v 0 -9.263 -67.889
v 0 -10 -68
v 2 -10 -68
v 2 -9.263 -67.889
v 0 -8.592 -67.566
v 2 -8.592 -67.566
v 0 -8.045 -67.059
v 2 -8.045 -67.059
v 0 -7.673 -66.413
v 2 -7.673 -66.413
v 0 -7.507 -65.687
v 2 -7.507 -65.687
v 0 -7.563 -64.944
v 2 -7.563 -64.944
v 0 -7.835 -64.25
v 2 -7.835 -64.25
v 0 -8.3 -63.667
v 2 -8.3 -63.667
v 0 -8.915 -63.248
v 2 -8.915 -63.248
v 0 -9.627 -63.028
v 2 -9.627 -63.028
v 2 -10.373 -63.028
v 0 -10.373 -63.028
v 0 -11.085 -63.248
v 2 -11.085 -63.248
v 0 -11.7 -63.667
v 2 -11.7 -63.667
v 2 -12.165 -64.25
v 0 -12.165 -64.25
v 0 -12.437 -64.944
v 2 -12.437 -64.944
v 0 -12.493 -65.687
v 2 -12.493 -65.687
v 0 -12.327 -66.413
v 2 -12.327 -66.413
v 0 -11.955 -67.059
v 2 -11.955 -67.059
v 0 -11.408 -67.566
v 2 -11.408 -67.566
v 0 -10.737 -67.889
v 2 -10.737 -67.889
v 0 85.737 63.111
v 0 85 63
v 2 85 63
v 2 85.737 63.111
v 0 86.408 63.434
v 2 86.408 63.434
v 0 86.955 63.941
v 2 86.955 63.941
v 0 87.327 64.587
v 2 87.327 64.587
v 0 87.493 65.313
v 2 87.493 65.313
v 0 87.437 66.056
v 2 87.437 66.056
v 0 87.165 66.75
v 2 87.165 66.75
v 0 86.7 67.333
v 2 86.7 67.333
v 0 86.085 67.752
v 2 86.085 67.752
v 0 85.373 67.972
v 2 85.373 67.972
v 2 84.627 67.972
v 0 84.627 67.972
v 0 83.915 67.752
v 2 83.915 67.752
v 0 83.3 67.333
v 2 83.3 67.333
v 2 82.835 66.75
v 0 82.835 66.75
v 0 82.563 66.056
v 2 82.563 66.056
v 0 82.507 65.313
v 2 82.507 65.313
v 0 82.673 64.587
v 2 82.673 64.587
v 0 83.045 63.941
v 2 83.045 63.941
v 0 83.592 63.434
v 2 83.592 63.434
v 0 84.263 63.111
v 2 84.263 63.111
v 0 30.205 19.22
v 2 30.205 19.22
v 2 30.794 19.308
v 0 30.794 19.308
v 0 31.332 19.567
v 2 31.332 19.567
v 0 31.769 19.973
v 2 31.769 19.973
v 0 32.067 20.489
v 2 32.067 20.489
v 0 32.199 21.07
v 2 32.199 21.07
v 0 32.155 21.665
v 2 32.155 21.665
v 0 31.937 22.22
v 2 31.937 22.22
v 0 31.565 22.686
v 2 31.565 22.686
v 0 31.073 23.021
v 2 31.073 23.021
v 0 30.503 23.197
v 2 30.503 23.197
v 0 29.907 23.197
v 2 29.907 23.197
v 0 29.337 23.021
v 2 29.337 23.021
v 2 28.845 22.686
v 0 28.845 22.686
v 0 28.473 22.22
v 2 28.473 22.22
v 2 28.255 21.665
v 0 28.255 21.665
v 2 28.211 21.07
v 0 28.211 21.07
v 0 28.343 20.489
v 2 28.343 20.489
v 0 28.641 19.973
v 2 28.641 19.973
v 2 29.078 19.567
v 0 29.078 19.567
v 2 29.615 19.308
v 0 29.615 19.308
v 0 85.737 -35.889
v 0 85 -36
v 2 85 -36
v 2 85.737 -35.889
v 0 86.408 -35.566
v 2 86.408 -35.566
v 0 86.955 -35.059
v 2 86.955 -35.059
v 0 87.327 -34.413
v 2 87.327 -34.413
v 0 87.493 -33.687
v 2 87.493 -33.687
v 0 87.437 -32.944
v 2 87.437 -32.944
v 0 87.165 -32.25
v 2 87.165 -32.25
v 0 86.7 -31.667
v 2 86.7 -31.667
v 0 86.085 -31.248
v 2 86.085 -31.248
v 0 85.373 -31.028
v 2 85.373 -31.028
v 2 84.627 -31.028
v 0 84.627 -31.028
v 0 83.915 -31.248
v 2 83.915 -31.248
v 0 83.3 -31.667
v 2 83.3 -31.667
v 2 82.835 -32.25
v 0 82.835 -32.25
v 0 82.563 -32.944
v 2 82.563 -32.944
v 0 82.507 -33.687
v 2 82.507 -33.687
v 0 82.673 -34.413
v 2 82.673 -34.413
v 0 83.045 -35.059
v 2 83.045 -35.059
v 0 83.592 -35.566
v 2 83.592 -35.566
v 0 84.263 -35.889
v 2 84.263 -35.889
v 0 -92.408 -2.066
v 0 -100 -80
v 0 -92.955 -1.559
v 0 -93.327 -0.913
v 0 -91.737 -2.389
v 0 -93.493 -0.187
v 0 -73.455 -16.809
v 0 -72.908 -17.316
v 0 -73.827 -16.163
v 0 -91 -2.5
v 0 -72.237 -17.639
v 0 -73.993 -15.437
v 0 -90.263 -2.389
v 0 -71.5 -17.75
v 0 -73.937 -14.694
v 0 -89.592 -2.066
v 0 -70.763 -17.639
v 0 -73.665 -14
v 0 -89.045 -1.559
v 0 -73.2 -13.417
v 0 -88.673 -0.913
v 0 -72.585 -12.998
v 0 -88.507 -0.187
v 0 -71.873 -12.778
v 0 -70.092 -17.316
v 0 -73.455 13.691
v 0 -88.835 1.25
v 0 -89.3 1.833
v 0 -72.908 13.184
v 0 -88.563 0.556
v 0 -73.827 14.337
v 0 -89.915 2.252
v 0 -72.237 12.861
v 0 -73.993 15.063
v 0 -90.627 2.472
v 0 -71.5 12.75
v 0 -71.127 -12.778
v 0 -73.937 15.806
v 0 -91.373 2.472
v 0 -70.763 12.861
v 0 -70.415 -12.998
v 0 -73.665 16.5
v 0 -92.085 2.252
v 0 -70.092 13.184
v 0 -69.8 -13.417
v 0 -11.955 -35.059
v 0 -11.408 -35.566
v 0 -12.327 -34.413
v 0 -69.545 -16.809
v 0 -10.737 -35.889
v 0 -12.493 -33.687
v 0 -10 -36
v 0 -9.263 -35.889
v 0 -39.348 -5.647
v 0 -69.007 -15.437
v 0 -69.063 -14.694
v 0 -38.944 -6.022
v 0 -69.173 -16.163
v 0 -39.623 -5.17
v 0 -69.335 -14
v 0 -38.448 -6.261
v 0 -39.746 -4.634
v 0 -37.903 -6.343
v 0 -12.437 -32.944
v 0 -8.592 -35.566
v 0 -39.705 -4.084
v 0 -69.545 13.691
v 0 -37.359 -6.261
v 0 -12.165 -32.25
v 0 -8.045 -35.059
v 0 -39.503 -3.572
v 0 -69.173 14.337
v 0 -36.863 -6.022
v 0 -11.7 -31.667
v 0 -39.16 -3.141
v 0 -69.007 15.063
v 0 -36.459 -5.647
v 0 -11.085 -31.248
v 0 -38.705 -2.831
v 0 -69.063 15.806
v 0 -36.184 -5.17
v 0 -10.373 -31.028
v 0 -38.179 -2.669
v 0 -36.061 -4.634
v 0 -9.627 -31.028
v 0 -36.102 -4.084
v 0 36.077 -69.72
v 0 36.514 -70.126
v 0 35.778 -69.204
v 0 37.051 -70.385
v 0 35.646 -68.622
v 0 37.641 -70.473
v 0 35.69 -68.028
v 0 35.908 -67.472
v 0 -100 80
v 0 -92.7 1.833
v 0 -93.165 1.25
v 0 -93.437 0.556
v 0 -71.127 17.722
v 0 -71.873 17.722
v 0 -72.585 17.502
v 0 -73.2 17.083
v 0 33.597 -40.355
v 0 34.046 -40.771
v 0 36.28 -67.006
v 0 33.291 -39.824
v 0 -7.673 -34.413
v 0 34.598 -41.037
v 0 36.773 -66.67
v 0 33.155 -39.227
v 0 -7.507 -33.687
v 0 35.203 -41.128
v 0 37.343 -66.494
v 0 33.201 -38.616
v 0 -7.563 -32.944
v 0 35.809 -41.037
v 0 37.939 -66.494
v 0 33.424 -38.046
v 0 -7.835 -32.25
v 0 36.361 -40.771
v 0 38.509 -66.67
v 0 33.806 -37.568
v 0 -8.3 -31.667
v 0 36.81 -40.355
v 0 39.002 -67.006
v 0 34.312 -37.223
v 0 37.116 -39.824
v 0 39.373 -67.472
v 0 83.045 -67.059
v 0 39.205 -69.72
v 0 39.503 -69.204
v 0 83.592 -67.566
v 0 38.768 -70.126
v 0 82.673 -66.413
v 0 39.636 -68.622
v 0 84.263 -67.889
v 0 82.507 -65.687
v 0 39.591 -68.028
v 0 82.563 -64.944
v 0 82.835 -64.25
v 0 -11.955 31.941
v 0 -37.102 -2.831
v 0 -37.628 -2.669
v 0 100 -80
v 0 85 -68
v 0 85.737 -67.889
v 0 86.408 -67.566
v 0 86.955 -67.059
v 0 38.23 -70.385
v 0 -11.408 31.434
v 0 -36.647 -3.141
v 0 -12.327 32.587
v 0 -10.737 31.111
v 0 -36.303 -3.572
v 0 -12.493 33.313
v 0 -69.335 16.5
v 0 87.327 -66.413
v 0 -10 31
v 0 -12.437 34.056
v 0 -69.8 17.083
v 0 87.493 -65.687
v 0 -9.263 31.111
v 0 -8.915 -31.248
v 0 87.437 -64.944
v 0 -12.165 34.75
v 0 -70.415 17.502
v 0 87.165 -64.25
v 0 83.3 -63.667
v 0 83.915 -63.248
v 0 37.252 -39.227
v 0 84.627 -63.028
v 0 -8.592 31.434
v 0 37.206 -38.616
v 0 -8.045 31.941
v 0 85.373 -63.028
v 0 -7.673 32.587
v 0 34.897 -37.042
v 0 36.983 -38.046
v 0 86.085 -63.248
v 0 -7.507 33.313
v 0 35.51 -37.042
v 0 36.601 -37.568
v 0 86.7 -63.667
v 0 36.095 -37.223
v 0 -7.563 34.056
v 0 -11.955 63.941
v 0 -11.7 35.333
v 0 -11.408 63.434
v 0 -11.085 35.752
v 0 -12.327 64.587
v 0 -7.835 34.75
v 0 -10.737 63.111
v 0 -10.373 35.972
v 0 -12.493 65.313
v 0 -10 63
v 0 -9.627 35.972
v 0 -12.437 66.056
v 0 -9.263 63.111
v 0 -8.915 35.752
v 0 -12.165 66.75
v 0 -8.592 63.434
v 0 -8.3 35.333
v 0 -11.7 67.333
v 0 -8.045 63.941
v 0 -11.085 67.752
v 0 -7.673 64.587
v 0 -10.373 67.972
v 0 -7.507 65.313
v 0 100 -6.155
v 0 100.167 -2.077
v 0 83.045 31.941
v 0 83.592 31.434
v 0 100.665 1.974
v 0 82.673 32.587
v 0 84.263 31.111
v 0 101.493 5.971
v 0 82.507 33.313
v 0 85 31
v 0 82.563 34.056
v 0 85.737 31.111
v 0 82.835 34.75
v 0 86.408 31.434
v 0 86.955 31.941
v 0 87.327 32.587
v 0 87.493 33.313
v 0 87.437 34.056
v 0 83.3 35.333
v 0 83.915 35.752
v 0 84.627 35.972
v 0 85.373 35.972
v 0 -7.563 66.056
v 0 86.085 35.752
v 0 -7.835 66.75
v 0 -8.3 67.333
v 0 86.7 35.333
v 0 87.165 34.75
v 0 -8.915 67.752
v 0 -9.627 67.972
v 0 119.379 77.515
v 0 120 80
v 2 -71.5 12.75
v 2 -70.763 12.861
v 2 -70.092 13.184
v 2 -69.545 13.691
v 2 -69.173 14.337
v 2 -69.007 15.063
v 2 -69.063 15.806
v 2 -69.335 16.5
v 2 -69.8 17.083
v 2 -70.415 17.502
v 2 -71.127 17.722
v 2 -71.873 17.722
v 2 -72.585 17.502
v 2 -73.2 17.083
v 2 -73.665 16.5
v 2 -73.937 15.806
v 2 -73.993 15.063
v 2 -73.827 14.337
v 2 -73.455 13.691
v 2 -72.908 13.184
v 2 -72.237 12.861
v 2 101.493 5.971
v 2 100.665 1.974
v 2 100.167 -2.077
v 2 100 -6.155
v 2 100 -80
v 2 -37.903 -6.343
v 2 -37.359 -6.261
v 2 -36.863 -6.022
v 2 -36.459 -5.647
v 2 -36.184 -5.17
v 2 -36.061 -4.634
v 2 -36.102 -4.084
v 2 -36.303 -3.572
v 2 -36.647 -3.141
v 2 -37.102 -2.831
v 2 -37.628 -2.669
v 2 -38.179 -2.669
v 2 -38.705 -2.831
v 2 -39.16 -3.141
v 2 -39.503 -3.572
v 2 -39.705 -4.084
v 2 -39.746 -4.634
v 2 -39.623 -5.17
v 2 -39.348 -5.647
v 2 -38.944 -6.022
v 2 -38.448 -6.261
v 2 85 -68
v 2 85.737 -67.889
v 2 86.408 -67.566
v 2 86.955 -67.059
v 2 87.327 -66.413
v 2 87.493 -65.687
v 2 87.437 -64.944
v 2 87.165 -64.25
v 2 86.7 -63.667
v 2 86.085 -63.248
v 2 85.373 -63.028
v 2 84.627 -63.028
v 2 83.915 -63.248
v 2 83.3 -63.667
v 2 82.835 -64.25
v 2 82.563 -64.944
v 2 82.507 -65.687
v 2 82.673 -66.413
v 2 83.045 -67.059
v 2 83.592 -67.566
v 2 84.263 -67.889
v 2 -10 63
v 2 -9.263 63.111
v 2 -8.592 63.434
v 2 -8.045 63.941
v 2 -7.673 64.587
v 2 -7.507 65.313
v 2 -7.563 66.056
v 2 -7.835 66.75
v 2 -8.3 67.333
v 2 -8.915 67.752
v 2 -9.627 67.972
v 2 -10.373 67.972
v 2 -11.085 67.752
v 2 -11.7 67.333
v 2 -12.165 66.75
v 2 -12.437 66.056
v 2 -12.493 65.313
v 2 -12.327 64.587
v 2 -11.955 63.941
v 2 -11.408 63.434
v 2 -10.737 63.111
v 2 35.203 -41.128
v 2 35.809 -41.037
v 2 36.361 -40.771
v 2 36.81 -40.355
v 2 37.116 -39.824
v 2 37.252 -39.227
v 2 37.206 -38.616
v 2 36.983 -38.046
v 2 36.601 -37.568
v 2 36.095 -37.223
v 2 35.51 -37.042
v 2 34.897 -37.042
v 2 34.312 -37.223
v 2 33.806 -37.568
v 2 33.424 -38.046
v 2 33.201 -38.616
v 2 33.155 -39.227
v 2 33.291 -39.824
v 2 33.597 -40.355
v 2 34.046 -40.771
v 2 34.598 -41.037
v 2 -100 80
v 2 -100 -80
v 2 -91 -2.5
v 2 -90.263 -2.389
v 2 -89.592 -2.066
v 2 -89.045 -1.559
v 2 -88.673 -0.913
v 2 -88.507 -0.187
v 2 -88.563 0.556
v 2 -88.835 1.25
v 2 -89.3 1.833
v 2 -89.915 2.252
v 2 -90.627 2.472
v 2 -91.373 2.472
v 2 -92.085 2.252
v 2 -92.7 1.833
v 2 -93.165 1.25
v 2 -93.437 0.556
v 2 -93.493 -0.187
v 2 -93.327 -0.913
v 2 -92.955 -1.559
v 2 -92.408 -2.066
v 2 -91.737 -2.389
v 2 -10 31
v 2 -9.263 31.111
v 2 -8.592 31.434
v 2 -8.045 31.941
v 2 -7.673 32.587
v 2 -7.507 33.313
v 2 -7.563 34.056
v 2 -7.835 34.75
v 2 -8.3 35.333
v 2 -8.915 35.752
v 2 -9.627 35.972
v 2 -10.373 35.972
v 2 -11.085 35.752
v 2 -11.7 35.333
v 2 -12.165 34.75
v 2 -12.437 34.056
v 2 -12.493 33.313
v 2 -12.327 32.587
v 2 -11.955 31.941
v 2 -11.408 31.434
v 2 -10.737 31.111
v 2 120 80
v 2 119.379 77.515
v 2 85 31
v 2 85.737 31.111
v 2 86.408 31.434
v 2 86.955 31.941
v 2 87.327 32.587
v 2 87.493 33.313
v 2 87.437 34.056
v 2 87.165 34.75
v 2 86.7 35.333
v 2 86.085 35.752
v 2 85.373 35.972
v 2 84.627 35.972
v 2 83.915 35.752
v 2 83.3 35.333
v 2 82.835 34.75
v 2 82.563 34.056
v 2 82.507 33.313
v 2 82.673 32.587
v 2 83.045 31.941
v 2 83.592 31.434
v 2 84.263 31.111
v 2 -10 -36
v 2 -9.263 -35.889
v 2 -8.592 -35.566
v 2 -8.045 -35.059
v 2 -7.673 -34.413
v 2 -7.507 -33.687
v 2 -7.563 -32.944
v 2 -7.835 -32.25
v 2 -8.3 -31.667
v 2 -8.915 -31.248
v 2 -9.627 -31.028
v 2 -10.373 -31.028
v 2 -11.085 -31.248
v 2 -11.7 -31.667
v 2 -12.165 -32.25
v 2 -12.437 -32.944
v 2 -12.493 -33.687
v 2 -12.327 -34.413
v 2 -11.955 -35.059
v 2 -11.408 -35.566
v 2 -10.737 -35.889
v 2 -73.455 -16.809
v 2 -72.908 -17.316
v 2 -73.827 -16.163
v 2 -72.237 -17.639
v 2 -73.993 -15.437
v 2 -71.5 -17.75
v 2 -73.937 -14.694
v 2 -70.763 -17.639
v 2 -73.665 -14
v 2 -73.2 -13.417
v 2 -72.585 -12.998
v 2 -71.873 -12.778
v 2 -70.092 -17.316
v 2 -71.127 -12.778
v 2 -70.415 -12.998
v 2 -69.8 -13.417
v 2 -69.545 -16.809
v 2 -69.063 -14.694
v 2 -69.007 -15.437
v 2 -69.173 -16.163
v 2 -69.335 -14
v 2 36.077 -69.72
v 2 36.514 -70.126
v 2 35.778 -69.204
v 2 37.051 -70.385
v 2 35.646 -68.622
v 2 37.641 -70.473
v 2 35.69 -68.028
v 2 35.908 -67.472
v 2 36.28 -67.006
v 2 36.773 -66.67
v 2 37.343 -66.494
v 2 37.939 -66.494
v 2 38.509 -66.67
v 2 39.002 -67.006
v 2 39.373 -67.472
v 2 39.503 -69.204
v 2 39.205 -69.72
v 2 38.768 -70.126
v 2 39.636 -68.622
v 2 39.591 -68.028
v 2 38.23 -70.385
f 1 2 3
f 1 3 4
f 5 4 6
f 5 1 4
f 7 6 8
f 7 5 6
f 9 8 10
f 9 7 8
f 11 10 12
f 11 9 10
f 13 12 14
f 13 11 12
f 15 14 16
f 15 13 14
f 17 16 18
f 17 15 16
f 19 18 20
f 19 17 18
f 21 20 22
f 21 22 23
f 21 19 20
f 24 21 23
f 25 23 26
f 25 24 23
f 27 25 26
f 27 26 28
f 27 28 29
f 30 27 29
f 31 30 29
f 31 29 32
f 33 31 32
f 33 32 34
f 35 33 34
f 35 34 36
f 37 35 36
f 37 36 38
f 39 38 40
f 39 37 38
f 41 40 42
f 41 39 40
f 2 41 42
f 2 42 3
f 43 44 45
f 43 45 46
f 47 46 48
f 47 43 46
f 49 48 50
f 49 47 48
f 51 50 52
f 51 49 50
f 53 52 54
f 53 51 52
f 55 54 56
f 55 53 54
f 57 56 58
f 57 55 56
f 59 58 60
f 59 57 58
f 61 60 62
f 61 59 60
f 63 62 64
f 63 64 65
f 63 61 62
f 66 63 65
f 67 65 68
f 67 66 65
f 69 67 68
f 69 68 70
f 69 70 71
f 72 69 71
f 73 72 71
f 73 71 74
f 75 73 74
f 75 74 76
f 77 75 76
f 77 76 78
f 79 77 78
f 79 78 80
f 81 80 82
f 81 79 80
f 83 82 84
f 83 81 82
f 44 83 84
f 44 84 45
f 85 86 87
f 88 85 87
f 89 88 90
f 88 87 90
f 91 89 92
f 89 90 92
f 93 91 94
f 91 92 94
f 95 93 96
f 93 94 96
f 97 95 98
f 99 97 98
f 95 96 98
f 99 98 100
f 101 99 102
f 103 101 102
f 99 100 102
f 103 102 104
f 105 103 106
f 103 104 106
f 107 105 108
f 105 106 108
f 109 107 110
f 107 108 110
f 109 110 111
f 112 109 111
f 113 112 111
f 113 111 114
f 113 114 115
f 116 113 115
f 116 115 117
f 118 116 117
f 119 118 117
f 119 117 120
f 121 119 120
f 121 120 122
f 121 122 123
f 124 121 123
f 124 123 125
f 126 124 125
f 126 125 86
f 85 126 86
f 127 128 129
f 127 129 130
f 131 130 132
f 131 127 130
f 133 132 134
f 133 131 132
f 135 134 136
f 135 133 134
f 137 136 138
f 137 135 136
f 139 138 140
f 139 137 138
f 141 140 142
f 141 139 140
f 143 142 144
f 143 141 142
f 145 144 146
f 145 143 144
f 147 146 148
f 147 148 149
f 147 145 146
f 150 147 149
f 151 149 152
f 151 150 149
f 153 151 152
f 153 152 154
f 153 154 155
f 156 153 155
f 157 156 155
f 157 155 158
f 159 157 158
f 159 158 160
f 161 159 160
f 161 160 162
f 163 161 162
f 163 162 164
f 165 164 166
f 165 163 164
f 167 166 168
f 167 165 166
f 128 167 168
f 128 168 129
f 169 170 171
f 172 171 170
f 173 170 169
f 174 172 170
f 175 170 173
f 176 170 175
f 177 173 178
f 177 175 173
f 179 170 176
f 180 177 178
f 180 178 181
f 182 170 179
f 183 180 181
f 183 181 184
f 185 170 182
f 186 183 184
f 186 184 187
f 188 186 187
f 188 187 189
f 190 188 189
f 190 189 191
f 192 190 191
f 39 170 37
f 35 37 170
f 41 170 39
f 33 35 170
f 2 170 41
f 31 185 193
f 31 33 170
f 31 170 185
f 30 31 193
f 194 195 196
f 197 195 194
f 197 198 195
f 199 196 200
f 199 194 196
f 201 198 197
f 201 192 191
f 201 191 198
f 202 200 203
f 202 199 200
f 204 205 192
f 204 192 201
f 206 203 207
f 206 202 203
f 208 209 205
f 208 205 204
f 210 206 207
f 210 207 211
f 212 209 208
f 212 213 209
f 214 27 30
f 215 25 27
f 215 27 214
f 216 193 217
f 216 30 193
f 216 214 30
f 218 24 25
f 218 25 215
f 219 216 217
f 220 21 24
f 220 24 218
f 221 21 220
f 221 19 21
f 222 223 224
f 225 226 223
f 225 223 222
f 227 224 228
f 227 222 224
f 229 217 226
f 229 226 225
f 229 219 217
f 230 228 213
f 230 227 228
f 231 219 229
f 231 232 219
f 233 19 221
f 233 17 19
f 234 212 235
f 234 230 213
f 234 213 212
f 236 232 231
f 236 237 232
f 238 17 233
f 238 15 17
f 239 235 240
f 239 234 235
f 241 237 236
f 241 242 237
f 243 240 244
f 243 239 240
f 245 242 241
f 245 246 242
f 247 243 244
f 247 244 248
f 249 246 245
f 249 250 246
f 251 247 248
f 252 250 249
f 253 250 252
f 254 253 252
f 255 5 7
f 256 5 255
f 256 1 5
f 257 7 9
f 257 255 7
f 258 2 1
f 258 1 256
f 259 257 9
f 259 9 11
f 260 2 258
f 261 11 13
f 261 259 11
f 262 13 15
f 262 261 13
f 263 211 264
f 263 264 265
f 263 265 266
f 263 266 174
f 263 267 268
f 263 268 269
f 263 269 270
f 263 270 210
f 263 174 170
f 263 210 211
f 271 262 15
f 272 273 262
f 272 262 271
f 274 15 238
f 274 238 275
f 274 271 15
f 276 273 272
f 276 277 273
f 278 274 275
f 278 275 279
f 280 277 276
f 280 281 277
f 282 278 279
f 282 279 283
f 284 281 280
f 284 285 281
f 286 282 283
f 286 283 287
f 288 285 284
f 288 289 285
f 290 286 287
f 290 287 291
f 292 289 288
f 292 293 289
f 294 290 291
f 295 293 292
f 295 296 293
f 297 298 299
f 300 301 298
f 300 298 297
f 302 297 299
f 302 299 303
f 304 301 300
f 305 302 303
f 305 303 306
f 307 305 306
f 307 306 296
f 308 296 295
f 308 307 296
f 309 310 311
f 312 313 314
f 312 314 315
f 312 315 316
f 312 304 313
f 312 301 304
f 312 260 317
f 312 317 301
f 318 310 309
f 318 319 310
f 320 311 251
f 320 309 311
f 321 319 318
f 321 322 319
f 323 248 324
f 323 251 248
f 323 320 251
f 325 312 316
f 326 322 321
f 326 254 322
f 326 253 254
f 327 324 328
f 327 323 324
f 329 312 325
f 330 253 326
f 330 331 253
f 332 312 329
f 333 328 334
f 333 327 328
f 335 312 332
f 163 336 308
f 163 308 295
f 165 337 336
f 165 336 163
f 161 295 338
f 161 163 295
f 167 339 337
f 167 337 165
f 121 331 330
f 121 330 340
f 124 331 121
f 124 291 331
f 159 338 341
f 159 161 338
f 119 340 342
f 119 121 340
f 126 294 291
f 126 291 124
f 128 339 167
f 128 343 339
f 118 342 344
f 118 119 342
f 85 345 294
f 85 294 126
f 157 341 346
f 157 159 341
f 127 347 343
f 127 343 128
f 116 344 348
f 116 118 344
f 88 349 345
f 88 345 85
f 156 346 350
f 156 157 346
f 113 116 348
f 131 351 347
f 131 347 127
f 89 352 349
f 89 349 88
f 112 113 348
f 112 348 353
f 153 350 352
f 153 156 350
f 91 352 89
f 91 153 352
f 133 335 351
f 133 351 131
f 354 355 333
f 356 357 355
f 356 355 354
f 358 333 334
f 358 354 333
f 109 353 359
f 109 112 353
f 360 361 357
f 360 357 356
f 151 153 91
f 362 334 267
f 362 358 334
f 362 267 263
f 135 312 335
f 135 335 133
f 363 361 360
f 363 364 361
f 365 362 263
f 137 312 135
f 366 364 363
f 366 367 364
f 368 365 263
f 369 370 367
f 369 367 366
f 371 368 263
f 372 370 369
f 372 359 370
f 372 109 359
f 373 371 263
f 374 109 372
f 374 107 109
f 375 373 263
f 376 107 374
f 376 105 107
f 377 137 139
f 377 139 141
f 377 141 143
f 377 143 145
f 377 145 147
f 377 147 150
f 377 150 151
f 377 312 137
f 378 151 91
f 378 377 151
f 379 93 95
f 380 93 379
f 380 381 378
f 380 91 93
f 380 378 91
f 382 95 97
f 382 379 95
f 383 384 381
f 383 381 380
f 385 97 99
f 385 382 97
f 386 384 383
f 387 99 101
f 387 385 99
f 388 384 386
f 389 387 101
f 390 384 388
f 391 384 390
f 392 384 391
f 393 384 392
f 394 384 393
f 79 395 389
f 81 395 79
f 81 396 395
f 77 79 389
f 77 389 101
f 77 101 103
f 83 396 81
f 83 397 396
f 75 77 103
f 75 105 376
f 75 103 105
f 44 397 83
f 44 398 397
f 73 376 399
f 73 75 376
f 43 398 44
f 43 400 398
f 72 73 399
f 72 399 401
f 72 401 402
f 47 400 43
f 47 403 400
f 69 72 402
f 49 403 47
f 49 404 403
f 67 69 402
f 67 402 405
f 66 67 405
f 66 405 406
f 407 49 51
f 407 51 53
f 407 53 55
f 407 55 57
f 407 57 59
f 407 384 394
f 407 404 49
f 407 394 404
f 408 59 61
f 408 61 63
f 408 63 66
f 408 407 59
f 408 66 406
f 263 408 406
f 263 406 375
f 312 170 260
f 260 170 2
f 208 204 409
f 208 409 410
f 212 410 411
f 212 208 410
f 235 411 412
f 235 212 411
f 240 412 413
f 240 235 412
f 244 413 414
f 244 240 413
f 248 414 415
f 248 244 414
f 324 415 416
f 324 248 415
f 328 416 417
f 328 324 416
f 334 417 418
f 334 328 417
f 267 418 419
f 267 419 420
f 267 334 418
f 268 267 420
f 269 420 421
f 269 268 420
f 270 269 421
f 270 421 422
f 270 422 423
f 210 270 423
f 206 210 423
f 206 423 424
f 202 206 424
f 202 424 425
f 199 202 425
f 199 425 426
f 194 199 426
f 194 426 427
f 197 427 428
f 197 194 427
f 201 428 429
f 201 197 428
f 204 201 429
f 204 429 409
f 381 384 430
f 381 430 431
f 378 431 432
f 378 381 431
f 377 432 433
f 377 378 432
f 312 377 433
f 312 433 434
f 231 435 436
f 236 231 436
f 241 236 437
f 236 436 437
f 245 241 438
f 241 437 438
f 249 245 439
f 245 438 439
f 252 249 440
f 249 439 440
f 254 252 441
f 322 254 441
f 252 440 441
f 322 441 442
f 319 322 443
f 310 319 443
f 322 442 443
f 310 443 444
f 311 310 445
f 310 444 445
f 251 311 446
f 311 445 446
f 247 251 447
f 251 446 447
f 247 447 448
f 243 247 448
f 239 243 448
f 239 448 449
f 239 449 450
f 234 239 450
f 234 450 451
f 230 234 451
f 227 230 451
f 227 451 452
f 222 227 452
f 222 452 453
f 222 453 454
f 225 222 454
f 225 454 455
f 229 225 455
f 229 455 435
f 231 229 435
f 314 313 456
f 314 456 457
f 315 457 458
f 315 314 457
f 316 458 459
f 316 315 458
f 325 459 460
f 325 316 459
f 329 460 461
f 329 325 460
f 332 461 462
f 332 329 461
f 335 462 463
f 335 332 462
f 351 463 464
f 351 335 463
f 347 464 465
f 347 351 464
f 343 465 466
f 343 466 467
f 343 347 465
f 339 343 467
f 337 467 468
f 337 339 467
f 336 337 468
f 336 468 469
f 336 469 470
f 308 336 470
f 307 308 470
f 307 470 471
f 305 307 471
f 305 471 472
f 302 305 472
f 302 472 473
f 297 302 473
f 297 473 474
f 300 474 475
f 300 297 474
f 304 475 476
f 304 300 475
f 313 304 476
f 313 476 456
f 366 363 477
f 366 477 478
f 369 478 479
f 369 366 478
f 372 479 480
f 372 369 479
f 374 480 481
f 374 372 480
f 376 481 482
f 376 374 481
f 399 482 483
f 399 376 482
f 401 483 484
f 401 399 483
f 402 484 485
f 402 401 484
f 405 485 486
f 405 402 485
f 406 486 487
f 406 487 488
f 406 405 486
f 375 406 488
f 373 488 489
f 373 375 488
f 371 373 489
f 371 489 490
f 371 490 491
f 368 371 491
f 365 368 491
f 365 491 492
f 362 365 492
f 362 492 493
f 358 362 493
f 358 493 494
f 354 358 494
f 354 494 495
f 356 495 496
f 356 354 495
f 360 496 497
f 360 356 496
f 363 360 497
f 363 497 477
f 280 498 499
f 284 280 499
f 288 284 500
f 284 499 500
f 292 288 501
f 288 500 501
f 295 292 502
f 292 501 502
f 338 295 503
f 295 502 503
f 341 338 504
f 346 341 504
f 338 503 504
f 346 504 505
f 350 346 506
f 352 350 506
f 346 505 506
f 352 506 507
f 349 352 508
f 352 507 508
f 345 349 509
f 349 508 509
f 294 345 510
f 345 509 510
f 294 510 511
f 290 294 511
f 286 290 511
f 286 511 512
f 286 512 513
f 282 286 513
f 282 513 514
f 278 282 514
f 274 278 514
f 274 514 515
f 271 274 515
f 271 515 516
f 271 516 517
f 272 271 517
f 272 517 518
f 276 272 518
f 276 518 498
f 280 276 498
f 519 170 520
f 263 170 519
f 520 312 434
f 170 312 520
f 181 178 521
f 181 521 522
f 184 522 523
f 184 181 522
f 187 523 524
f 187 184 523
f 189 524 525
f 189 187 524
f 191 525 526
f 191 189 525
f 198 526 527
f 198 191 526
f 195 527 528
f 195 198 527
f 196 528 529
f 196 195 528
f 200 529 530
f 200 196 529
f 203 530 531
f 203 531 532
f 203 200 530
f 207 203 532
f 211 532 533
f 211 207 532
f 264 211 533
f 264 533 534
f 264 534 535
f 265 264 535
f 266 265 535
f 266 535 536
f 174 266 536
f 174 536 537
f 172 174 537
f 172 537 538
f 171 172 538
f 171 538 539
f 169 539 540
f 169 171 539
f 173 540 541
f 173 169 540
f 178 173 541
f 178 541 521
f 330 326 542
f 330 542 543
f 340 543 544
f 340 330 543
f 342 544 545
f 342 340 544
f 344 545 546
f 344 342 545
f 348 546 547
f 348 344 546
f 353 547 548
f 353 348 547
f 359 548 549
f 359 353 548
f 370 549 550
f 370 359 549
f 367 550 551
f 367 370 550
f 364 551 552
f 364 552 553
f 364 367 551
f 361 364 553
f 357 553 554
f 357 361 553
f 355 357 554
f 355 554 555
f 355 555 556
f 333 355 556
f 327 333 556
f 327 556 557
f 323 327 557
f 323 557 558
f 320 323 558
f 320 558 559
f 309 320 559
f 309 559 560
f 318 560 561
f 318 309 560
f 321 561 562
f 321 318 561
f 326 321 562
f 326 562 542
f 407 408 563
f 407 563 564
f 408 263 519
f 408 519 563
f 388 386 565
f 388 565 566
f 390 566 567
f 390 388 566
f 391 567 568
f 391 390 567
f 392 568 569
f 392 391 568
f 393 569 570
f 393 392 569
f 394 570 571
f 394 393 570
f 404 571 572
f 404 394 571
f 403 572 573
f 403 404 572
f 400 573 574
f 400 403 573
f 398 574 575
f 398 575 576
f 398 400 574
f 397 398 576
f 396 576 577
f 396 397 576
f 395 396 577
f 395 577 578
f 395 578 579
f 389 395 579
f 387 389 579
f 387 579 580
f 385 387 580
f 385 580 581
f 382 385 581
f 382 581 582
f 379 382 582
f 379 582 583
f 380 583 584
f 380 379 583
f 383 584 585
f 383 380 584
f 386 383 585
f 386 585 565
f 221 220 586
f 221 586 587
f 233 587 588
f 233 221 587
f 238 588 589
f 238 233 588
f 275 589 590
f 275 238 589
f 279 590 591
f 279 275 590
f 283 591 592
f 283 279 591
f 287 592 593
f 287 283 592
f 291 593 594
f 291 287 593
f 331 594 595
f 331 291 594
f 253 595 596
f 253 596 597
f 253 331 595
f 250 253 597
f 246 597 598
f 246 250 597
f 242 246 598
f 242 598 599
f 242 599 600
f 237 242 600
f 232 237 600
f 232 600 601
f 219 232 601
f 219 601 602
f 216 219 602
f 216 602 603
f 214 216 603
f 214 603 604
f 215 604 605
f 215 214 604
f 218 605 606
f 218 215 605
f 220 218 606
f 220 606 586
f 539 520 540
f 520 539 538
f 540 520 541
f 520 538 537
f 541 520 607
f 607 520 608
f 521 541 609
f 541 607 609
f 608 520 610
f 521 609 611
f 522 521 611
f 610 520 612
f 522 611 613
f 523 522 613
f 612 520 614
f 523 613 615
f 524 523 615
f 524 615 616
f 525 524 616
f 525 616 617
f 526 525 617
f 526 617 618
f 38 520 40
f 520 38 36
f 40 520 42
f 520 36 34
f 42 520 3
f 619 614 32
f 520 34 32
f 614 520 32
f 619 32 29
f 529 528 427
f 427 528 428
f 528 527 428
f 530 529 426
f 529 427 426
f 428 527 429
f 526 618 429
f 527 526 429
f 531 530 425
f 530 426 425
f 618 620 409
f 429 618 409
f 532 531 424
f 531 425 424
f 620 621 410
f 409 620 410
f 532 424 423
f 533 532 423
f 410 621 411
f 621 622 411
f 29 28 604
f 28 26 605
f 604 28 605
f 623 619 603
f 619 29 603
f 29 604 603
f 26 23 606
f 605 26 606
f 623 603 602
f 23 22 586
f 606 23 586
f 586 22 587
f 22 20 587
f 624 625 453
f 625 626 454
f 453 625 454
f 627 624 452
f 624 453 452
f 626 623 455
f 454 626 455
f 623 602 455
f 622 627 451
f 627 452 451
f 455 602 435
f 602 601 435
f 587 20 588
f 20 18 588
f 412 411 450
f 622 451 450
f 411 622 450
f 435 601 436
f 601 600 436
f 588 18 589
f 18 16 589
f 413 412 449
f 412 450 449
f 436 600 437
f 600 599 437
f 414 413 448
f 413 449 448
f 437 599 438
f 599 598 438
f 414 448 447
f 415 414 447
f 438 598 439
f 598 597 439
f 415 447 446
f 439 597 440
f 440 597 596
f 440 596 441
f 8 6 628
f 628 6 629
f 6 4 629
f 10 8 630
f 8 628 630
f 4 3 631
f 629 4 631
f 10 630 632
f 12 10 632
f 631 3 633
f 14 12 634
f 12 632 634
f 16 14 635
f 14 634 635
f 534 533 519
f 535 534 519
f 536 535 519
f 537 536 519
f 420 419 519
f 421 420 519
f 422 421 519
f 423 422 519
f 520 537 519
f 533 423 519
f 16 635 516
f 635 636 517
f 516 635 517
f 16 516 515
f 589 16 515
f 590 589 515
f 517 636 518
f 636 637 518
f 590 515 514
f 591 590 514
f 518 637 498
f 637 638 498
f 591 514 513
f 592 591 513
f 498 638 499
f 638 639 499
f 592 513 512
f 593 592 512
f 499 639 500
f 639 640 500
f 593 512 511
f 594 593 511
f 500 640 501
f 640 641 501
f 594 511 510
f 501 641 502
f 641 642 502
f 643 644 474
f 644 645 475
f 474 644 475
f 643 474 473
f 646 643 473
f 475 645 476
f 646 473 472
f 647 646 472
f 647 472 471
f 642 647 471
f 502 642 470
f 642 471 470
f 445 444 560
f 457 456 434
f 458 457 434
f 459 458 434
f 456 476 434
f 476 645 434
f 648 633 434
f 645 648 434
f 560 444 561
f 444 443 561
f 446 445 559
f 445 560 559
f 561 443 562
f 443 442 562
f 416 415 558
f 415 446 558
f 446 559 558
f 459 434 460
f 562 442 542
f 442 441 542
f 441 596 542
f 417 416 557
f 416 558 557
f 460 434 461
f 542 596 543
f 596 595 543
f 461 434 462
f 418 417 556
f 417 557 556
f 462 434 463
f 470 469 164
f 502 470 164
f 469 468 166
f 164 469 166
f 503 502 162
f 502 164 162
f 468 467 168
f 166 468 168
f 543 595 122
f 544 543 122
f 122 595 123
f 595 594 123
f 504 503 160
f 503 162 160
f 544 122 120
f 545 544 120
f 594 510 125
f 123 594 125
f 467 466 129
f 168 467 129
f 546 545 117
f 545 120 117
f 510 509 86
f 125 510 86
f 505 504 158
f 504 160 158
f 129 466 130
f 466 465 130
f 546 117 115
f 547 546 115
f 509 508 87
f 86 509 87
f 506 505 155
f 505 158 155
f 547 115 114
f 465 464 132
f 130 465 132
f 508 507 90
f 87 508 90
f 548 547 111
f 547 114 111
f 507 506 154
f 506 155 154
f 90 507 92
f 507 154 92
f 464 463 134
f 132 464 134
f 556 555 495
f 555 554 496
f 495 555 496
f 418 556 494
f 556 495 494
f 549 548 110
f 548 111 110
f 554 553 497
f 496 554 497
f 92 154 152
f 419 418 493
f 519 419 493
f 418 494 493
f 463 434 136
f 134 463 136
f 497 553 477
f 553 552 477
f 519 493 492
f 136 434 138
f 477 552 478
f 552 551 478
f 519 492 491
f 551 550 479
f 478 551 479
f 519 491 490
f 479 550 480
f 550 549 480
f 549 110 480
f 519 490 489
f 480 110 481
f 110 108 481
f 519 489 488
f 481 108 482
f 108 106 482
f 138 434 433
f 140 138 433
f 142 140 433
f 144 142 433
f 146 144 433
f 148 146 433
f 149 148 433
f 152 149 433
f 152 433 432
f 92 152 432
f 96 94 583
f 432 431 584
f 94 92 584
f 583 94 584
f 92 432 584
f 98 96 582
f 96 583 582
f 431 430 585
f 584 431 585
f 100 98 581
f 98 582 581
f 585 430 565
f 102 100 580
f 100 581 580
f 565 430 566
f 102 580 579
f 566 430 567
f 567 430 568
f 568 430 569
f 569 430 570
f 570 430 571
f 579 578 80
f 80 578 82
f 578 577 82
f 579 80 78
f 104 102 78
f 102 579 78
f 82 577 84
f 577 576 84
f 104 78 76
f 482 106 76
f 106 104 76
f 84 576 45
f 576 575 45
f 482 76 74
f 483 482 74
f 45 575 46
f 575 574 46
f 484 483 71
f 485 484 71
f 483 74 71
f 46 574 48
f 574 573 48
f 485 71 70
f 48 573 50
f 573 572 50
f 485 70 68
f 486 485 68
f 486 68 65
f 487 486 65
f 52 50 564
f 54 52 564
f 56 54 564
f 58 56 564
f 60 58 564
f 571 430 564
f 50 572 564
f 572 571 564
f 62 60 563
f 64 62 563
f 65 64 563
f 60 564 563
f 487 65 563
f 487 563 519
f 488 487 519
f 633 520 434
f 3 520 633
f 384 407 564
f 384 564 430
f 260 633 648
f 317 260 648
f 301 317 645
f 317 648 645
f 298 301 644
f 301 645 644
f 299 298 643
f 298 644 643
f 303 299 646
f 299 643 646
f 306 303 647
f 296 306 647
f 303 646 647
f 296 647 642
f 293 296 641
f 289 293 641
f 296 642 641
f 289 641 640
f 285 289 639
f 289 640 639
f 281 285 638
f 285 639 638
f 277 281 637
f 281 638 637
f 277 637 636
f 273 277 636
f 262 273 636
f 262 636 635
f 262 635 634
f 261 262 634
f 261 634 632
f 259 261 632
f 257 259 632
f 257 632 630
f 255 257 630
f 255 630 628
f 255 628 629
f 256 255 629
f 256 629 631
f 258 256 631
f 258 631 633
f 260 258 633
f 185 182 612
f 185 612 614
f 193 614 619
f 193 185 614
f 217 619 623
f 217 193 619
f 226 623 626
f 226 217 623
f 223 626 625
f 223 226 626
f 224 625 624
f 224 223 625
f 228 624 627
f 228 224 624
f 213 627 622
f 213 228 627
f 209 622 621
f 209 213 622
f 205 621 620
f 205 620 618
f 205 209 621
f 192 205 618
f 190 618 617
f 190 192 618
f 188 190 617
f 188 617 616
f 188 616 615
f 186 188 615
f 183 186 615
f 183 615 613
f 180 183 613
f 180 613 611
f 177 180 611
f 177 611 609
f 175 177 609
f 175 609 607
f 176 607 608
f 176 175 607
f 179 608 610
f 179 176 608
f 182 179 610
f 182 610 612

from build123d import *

# Parameters (mm, degrees)
SKETCH_1_R          = 2.5
EXTRUDE_1_DEPTH     = 2
SKETCH_2_R          = 2.000656811
SKETCH_2_R_2        = 2.054404912
SKETCH_2_R_3        = 2
SKETCH_2_R_4        = 1.847510468
CUT_EXTRUDE_1_DEPTH = 3


with BuildPart() as part:
    # 草图1 → 凸台-拉伸1 (new body)
    with BuildSketch(Plane(origin=(0, 0, 0), x_dir=(0, 0, -1), z_dir=(1, 0, 0))):
        with BuildLine():
            Line((80, -100), (-80, -100))
            Line((-80, -100), (-80, 100))
            Line((-80, 100), (-80, 117.438447187))
            Line((-80, 117.438447187), (-80, 120))
            Line((-80, 120), (-77.51492875, 119.378732187))
            Line((-77.51492875, 119.378732187), (-5.971499971, 101.492874993))
            ThreePointArc((-5.971499971, 101.492874993), (0.046118096, 100.374622166), (6.155281281, 100))
            Line((6.155281281, 100), (80, 100))
            Line((80, 100), (80, -100))
        make_face()
        with Locations((-65.5, -10)):
            Circle(SKETCH_1_R, mode=Mode.SUBTRACT)
        with Locations((-33.5, -10)):
            Circle(SKETCH_1_R, mode=Mode.SUBTRACT)
        with Locations((-65.5, 85)):
            Circle(SKETCH_1_R, mode=Mode.SUBTRACT)
        with Locations((-33.5, 85)):
            Circle(SKETCH_1_R, mode=Mode.SUBTRACT)
        with Locations((33.5, 85)):
            Circle(SKETCH_1_R, mode=Mode.SUBTRACT)
        with Locations((65.5, 85)):
            Circle(SKETCH_1_R, mode=Mode.SUBTRACT)
        with Locations((33.5, -10)):
            Circle(SKETCH_1_R, mode=Mode.SUBTRACT)
        with Locations((65.5, -10)):
            Circle(SKETCH_1_R, mode=Mode.SUBTRACT)
        with Locations((0, -91)):
            Circle(SKETCH_1_R, mode=Mode.SUBTRACT)
        with Locations((-15.25, -71.5)):
            Circle(SKETCH_1_R, mode=Mode.SUBTRACT)
        with Locations((15.25, -71.5)):
            Circle(SKETCH_1_R, mode=Mode.SUBTRACT)
    extrude(amount=EXTRUDE_1_DEPTH)

    # 草图2 → 切除-拉伸1 (cut, through all)
    with BuildSketch(Plane(origin=(2, 0, 0), x_dir=(0, 0, -1), z_dir=(1, 0, 0))):
        with Locations((68.472742663, 37.640760233)):
            Circle(SKETCH_2_R)
        with Locations((39.073599545, 35.20346994)):
            Circle(SKETCH_2_R_2)
        with Locations((-21.219558373, 30.20495934)):
            Circle(SKETCH_2_R_3)
        with Locations((4.495464774, -37.903319045)):
            Circle(SKETCH_2_R_4)
    extrude(amount=-CUT_EXTRUDE_1_DEPTH, mode=Mode.SUBTRACT)


solid = part.part
